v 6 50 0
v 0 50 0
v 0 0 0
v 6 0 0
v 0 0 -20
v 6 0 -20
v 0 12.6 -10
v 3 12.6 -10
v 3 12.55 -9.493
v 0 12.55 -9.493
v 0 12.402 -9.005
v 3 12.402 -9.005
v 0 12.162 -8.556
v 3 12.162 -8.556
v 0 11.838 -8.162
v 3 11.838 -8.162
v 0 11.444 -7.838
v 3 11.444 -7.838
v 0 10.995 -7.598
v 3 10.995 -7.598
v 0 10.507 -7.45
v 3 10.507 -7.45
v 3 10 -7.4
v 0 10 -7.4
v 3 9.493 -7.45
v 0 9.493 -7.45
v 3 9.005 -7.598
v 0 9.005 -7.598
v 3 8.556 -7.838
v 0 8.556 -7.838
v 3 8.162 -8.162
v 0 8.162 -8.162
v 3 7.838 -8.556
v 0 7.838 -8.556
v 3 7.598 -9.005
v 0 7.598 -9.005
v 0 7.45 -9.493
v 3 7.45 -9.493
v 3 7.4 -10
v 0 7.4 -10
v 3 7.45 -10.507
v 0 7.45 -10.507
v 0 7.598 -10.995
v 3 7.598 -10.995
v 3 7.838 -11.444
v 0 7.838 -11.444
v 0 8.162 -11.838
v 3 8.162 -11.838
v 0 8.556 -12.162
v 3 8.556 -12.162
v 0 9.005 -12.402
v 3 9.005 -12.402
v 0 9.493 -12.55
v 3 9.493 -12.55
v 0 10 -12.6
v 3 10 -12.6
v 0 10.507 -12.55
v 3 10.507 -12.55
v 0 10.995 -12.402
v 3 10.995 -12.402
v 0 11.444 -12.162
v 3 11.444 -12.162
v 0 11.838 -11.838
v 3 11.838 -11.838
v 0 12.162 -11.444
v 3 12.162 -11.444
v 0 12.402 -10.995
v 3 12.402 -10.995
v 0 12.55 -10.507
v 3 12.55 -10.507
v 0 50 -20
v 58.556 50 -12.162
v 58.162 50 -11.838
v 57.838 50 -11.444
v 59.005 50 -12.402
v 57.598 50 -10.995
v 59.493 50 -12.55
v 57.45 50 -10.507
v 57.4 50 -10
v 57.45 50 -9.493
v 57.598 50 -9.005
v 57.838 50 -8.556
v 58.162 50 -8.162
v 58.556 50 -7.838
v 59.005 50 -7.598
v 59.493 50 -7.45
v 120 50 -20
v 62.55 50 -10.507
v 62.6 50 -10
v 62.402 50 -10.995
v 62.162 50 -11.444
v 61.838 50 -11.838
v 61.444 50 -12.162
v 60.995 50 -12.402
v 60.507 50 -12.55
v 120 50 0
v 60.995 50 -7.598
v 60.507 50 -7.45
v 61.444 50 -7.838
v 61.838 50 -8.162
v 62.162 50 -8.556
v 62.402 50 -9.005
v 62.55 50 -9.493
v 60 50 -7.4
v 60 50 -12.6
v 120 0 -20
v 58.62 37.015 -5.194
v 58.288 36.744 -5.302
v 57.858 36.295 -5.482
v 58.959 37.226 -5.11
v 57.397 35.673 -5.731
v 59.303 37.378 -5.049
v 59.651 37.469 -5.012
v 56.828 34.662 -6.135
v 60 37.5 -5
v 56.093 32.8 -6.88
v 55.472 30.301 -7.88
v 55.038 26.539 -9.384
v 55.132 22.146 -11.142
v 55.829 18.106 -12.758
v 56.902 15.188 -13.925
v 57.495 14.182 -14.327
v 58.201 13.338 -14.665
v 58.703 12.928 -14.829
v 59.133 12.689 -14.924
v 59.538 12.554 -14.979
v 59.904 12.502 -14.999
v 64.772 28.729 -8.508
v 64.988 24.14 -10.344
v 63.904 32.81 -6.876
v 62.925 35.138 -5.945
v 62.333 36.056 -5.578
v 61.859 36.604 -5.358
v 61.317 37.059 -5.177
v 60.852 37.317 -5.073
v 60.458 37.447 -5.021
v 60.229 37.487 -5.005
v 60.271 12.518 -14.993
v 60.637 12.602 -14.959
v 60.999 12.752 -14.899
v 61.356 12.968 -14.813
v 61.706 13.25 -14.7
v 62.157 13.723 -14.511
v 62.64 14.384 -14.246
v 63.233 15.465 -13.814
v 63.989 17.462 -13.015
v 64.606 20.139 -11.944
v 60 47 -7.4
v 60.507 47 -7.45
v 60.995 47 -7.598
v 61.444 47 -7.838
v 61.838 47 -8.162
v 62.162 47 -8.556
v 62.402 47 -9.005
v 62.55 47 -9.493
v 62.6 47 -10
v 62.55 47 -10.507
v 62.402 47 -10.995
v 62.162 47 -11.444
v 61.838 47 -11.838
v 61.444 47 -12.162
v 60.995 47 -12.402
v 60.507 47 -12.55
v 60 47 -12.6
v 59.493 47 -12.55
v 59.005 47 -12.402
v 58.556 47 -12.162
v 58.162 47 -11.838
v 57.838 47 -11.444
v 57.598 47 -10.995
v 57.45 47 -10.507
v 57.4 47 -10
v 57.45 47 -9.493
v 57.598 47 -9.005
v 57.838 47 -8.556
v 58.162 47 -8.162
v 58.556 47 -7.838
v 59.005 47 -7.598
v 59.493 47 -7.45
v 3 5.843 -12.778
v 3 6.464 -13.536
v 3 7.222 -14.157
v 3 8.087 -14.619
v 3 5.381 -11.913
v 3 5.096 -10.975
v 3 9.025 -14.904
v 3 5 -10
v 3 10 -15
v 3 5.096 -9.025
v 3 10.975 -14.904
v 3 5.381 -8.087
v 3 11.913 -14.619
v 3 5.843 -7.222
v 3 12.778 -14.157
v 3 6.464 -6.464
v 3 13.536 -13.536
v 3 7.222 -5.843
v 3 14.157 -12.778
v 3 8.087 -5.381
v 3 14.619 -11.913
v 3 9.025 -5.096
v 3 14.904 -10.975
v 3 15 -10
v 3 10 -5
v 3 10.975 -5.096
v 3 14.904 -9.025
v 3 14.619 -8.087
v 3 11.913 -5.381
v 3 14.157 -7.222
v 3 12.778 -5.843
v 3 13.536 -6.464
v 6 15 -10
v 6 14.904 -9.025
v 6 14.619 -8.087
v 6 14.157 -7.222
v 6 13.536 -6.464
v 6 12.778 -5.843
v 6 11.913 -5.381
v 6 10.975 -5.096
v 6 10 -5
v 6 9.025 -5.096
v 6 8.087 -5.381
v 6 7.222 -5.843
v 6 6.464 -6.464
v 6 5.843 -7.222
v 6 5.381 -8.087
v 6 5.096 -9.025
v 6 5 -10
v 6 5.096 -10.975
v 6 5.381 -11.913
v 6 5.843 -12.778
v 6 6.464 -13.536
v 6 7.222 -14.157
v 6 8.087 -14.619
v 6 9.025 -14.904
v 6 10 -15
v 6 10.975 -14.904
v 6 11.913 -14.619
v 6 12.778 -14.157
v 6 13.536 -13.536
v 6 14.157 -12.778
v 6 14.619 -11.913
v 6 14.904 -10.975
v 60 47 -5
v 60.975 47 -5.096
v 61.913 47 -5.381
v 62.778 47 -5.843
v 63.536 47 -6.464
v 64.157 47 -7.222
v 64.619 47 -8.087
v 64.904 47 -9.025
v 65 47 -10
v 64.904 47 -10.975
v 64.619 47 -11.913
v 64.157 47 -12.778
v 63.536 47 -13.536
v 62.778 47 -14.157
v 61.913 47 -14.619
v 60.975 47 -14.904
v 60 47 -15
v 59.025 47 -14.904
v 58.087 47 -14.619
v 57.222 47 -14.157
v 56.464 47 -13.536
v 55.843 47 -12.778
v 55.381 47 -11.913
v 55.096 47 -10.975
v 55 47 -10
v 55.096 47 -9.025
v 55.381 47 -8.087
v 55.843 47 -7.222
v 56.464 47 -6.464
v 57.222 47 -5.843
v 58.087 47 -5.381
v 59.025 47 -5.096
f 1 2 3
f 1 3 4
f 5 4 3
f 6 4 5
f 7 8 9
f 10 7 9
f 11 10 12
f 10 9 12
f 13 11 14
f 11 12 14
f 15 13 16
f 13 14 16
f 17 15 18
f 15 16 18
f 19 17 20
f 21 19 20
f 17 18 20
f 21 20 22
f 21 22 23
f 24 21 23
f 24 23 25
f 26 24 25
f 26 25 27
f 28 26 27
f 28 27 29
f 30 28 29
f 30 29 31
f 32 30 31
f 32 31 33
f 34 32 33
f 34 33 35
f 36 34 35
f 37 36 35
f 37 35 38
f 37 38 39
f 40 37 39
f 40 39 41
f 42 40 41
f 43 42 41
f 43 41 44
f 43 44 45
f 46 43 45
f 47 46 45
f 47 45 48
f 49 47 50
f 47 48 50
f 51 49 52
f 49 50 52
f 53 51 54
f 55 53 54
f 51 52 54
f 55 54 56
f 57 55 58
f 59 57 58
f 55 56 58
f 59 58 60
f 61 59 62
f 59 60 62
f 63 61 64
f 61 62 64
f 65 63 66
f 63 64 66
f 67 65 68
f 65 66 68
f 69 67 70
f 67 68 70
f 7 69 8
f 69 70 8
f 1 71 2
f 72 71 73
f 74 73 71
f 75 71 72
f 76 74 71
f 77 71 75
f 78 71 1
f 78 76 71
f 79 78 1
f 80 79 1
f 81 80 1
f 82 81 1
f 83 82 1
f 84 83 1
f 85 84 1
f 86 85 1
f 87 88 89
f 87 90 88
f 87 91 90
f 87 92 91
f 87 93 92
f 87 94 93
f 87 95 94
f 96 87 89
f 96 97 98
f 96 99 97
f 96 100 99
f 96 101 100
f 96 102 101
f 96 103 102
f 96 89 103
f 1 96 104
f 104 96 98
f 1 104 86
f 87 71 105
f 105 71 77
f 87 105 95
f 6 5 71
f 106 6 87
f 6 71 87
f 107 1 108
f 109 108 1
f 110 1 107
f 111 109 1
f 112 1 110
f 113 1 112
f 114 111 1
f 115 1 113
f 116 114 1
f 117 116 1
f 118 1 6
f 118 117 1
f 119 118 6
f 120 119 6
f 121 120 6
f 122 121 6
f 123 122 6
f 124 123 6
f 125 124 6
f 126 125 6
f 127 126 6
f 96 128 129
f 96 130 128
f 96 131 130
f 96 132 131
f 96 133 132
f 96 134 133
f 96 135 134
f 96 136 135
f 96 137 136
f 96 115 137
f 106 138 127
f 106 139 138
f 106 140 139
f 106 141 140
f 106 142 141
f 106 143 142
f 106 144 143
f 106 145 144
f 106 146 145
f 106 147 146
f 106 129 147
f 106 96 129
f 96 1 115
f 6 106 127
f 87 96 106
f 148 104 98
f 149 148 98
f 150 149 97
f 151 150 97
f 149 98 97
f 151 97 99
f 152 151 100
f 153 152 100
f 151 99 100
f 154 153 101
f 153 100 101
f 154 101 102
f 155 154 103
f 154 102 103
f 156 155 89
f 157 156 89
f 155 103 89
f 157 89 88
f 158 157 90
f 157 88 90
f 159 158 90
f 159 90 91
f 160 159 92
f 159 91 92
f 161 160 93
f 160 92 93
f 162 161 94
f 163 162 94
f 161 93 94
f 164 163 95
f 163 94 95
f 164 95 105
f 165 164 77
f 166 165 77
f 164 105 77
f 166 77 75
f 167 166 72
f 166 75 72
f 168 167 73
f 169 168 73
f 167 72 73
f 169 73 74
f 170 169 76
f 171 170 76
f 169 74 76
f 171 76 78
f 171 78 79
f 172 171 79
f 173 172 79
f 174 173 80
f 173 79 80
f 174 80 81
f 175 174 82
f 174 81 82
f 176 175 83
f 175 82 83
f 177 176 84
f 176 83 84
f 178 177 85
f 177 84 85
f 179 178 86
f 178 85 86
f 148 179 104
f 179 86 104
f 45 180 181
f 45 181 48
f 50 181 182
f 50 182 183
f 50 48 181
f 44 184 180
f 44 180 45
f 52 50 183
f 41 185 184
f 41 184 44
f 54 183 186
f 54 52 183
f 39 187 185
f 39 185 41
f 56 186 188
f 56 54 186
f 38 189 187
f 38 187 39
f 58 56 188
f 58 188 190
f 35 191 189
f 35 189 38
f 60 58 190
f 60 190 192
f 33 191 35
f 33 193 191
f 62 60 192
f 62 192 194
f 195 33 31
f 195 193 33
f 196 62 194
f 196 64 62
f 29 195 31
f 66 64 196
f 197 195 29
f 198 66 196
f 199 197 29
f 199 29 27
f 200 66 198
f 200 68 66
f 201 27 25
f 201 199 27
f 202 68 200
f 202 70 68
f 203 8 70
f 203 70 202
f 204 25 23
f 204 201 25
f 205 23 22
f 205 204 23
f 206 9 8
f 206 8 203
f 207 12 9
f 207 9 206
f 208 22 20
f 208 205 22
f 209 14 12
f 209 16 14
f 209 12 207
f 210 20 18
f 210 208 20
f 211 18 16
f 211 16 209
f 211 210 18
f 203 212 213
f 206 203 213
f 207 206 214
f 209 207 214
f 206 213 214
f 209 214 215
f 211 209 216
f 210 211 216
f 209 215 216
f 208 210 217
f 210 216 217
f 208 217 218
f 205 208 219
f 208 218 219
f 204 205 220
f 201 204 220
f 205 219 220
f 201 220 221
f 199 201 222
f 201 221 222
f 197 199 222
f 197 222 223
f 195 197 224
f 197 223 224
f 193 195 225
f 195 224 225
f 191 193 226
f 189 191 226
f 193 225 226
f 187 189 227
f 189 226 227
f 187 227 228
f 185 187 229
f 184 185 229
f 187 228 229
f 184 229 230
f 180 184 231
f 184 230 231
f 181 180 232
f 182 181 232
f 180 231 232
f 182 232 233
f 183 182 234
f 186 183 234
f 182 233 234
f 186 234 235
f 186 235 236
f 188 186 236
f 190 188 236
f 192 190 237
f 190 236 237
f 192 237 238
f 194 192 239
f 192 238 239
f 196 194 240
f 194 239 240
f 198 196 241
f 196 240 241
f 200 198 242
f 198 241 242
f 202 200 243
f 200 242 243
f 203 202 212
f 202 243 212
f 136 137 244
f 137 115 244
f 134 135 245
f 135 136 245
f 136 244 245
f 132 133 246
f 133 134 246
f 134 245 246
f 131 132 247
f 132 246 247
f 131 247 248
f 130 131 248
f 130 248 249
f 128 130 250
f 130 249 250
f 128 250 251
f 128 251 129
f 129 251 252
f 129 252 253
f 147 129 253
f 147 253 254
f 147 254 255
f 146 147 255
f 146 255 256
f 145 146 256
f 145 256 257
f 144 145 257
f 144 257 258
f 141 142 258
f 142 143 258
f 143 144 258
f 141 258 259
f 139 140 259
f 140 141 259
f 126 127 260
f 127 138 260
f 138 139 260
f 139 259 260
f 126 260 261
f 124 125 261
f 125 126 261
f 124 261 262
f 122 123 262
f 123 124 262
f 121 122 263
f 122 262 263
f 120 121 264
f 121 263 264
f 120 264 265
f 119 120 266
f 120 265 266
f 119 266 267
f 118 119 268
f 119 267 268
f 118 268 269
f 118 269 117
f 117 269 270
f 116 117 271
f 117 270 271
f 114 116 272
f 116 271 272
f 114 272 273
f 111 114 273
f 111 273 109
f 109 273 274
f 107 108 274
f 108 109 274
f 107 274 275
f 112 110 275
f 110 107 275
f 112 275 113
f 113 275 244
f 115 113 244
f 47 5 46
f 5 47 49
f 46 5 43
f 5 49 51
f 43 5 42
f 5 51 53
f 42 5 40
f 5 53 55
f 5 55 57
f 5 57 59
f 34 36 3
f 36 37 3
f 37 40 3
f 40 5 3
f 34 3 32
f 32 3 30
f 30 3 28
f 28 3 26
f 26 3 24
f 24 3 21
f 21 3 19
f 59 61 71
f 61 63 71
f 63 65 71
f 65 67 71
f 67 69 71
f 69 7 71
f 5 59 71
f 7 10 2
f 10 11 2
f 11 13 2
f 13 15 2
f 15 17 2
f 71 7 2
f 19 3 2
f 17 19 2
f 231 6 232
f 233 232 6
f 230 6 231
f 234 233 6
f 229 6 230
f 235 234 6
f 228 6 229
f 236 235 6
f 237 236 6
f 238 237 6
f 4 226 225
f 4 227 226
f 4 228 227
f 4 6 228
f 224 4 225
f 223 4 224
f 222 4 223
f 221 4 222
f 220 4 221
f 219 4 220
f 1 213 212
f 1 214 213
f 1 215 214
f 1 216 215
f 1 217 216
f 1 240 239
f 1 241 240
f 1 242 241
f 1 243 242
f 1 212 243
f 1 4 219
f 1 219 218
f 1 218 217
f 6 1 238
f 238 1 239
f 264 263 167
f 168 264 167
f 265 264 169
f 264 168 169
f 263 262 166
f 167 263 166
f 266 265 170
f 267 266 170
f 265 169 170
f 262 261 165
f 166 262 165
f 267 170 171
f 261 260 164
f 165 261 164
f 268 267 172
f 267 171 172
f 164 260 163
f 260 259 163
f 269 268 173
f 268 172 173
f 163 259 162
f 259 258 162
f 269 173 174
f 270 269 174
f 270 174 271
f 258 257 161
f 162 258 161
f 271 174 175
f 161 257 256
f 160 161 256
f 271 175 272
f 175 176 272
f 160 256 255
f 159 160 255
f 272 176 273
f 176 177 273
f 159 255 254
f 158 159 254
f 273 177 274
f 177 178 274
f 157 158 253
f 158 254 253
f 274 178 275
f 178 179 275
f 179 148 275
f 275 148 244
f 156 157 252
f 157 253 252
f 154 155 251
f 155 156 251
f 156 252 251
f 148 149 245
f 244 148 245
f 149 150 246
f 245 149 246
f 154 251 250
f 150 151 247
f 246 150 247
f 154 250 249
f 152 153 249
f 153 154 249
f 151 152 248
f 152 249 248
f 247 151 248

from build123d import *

# Parameters (mm, degrees)
SKETCH_1_W          = 120
SKETCH_1_H          = 20
EXTRUDE_1_DEPTH     = 50
SKETCH_2_W          = 6
SKETCH_2_H          = 20
EXTRUDE_2_DEPTH     = 20
CUT_EXTRUDE_1_DEPTH = 114
SKETCH_4_R          = 2.6
SKETCH_4_W          = 20
SKETCH_4_H          = 20
CUT_EXTRUDE_2_DEPTH = 114
SKETCH_5_R          = 5
CUT_EXTRUDE_3_DEPTH = 3
CUT_EXTRUDE_4_DEPTH = 300
SKETCH_8_R          = 5
CUT_EXTRUDE_5_DEPTH = 300
SKETCH_9_R          = 5
SKETCH_9_R_2        = 2.6
EXTRUDE_3_DEPTH     = 3


with BuildPart() as part:
    # 草图1 → 凸台-拉伸1 (new body)
    with BuildSketch(Plane(origin=(0, 0, 0), x_dir=(1, 0, 0), z_dir=(0, 1, 0))):
        with Locations((60, 10)):
            Rectangle(SKETCH_1_W, SKETCH_1_H)
    extrude(amount=EXTRUDE_1_DEPTH)

    # 草图2 → 凸台-拉伸2 (add)
    with BuildSketch(Plane.XY):
        with Locations((3, -10)):
            Rectangle(SKETCH_2_W, SKETCH_2_H)
    extrude(amount=-EXTRUDE_2_DEPTH)

    # 草图3 → 切除-拉伸1 (cut)
    with BuildSketch(Plane(origin=(120, 0, 0), x_dir=(0, 0, -1), z_dir=(1, 0, 0))):
        Polygon((0, 50), (20, 0), (0, 0), align=None)
    extrude(amount=-CUT_EXTRUDE_1_DEPTH, mode=Mode.SUBTRACT)

    # 草图4 → 切除-拉伸2 (cut)
    with BuildSketch(Plane(origin=(6, 0, 0), x_dir=(0, 0, -1), z_dir=(1, 0, 0))):
        with Locations(Location((10, 10, 0), (0, 0, 90))):
            Circle(SKETCH_4_R)
        with Locations((10, -10)):
            Rectangle(SKETCH_4_W, SKETCH_4_H)
    extrude(amount=-CUT_EXTRUDE_2_DEPTH, mode=Mode.SUBTRACT)

    # 草图5 → 切除-拉伸3 (cut)
    with BuildSketch(Plane(origin=(6, 0, 0), x_dir=(0, 0, -1), z_dir=(1, 0, 0))):
        with Locations(Location((10, 10, 0), (0, 0, 90))):
            Circle(SKETCH_5_R)
    extrude(amount=-CUT_EXTRUDE_3_DEPTH, mode=Mode.SUBTRACT)

    # 草图6 → 切除-拉伸4 (cut)
    with BuildSketch(Plane(origin=(0, 50, 0), x_dir=(1, 0, 0), z_dir=(0, 1, 0))):
        with BuildLine():
            ThreePointArc((62.6, 10), (61.838477631, 11.838477631), (60, 12.6))
            Line((60, 12.6), (60, 7.4))
            ThreePointArc((60, 7.4), (61.838477631, 8.161522369), (62.6, 10))
        make_face()
        with BuildLine():
            Line((60, 7.4), (60, 12.6))
            ThreePointArc((60, 12.6), (57.4, 10), (60, 7.4))
        make_face()
    extrude(amount=-CUT_EXTRUDE_4_DEPTH, mode=Mode.SUBTRACT)

    # 草图8 → 切除-拉伸5 (cut)
    with BuildSketch(Plane(origin=(0, 50, 0), x_dir=(1, 0, 0), z_dir=(0, 1, 0))):
        with Locations(Location((60, 10, 0), (0, 0, 270))):
            Circle(SKETCH_8_R)
    extrude(amount=-CUT_EXTRUDE_5_DEPTH, mode=Mode.SUBTRACT)

    # 草图9 → 凸台-拉伸3 (add)
    with BuildSketch(Plane(origin=(0, 50, 0), x_dir=(1, 0, 0), z_dir=(0, 1, 0))):
        with Locations(Location((60, 10, 0), (0, 0, 270))):
            Circle(SKETCH_9_R)
        with Locations(Location((60, 10, 0), (0, 0, 270))):
            Circle(SKETCH_9_R_2, mode=Mode.SUBTRACT)
    extrude(amount=-EXTRUDE_3_DEPTH)


solid = part.part
